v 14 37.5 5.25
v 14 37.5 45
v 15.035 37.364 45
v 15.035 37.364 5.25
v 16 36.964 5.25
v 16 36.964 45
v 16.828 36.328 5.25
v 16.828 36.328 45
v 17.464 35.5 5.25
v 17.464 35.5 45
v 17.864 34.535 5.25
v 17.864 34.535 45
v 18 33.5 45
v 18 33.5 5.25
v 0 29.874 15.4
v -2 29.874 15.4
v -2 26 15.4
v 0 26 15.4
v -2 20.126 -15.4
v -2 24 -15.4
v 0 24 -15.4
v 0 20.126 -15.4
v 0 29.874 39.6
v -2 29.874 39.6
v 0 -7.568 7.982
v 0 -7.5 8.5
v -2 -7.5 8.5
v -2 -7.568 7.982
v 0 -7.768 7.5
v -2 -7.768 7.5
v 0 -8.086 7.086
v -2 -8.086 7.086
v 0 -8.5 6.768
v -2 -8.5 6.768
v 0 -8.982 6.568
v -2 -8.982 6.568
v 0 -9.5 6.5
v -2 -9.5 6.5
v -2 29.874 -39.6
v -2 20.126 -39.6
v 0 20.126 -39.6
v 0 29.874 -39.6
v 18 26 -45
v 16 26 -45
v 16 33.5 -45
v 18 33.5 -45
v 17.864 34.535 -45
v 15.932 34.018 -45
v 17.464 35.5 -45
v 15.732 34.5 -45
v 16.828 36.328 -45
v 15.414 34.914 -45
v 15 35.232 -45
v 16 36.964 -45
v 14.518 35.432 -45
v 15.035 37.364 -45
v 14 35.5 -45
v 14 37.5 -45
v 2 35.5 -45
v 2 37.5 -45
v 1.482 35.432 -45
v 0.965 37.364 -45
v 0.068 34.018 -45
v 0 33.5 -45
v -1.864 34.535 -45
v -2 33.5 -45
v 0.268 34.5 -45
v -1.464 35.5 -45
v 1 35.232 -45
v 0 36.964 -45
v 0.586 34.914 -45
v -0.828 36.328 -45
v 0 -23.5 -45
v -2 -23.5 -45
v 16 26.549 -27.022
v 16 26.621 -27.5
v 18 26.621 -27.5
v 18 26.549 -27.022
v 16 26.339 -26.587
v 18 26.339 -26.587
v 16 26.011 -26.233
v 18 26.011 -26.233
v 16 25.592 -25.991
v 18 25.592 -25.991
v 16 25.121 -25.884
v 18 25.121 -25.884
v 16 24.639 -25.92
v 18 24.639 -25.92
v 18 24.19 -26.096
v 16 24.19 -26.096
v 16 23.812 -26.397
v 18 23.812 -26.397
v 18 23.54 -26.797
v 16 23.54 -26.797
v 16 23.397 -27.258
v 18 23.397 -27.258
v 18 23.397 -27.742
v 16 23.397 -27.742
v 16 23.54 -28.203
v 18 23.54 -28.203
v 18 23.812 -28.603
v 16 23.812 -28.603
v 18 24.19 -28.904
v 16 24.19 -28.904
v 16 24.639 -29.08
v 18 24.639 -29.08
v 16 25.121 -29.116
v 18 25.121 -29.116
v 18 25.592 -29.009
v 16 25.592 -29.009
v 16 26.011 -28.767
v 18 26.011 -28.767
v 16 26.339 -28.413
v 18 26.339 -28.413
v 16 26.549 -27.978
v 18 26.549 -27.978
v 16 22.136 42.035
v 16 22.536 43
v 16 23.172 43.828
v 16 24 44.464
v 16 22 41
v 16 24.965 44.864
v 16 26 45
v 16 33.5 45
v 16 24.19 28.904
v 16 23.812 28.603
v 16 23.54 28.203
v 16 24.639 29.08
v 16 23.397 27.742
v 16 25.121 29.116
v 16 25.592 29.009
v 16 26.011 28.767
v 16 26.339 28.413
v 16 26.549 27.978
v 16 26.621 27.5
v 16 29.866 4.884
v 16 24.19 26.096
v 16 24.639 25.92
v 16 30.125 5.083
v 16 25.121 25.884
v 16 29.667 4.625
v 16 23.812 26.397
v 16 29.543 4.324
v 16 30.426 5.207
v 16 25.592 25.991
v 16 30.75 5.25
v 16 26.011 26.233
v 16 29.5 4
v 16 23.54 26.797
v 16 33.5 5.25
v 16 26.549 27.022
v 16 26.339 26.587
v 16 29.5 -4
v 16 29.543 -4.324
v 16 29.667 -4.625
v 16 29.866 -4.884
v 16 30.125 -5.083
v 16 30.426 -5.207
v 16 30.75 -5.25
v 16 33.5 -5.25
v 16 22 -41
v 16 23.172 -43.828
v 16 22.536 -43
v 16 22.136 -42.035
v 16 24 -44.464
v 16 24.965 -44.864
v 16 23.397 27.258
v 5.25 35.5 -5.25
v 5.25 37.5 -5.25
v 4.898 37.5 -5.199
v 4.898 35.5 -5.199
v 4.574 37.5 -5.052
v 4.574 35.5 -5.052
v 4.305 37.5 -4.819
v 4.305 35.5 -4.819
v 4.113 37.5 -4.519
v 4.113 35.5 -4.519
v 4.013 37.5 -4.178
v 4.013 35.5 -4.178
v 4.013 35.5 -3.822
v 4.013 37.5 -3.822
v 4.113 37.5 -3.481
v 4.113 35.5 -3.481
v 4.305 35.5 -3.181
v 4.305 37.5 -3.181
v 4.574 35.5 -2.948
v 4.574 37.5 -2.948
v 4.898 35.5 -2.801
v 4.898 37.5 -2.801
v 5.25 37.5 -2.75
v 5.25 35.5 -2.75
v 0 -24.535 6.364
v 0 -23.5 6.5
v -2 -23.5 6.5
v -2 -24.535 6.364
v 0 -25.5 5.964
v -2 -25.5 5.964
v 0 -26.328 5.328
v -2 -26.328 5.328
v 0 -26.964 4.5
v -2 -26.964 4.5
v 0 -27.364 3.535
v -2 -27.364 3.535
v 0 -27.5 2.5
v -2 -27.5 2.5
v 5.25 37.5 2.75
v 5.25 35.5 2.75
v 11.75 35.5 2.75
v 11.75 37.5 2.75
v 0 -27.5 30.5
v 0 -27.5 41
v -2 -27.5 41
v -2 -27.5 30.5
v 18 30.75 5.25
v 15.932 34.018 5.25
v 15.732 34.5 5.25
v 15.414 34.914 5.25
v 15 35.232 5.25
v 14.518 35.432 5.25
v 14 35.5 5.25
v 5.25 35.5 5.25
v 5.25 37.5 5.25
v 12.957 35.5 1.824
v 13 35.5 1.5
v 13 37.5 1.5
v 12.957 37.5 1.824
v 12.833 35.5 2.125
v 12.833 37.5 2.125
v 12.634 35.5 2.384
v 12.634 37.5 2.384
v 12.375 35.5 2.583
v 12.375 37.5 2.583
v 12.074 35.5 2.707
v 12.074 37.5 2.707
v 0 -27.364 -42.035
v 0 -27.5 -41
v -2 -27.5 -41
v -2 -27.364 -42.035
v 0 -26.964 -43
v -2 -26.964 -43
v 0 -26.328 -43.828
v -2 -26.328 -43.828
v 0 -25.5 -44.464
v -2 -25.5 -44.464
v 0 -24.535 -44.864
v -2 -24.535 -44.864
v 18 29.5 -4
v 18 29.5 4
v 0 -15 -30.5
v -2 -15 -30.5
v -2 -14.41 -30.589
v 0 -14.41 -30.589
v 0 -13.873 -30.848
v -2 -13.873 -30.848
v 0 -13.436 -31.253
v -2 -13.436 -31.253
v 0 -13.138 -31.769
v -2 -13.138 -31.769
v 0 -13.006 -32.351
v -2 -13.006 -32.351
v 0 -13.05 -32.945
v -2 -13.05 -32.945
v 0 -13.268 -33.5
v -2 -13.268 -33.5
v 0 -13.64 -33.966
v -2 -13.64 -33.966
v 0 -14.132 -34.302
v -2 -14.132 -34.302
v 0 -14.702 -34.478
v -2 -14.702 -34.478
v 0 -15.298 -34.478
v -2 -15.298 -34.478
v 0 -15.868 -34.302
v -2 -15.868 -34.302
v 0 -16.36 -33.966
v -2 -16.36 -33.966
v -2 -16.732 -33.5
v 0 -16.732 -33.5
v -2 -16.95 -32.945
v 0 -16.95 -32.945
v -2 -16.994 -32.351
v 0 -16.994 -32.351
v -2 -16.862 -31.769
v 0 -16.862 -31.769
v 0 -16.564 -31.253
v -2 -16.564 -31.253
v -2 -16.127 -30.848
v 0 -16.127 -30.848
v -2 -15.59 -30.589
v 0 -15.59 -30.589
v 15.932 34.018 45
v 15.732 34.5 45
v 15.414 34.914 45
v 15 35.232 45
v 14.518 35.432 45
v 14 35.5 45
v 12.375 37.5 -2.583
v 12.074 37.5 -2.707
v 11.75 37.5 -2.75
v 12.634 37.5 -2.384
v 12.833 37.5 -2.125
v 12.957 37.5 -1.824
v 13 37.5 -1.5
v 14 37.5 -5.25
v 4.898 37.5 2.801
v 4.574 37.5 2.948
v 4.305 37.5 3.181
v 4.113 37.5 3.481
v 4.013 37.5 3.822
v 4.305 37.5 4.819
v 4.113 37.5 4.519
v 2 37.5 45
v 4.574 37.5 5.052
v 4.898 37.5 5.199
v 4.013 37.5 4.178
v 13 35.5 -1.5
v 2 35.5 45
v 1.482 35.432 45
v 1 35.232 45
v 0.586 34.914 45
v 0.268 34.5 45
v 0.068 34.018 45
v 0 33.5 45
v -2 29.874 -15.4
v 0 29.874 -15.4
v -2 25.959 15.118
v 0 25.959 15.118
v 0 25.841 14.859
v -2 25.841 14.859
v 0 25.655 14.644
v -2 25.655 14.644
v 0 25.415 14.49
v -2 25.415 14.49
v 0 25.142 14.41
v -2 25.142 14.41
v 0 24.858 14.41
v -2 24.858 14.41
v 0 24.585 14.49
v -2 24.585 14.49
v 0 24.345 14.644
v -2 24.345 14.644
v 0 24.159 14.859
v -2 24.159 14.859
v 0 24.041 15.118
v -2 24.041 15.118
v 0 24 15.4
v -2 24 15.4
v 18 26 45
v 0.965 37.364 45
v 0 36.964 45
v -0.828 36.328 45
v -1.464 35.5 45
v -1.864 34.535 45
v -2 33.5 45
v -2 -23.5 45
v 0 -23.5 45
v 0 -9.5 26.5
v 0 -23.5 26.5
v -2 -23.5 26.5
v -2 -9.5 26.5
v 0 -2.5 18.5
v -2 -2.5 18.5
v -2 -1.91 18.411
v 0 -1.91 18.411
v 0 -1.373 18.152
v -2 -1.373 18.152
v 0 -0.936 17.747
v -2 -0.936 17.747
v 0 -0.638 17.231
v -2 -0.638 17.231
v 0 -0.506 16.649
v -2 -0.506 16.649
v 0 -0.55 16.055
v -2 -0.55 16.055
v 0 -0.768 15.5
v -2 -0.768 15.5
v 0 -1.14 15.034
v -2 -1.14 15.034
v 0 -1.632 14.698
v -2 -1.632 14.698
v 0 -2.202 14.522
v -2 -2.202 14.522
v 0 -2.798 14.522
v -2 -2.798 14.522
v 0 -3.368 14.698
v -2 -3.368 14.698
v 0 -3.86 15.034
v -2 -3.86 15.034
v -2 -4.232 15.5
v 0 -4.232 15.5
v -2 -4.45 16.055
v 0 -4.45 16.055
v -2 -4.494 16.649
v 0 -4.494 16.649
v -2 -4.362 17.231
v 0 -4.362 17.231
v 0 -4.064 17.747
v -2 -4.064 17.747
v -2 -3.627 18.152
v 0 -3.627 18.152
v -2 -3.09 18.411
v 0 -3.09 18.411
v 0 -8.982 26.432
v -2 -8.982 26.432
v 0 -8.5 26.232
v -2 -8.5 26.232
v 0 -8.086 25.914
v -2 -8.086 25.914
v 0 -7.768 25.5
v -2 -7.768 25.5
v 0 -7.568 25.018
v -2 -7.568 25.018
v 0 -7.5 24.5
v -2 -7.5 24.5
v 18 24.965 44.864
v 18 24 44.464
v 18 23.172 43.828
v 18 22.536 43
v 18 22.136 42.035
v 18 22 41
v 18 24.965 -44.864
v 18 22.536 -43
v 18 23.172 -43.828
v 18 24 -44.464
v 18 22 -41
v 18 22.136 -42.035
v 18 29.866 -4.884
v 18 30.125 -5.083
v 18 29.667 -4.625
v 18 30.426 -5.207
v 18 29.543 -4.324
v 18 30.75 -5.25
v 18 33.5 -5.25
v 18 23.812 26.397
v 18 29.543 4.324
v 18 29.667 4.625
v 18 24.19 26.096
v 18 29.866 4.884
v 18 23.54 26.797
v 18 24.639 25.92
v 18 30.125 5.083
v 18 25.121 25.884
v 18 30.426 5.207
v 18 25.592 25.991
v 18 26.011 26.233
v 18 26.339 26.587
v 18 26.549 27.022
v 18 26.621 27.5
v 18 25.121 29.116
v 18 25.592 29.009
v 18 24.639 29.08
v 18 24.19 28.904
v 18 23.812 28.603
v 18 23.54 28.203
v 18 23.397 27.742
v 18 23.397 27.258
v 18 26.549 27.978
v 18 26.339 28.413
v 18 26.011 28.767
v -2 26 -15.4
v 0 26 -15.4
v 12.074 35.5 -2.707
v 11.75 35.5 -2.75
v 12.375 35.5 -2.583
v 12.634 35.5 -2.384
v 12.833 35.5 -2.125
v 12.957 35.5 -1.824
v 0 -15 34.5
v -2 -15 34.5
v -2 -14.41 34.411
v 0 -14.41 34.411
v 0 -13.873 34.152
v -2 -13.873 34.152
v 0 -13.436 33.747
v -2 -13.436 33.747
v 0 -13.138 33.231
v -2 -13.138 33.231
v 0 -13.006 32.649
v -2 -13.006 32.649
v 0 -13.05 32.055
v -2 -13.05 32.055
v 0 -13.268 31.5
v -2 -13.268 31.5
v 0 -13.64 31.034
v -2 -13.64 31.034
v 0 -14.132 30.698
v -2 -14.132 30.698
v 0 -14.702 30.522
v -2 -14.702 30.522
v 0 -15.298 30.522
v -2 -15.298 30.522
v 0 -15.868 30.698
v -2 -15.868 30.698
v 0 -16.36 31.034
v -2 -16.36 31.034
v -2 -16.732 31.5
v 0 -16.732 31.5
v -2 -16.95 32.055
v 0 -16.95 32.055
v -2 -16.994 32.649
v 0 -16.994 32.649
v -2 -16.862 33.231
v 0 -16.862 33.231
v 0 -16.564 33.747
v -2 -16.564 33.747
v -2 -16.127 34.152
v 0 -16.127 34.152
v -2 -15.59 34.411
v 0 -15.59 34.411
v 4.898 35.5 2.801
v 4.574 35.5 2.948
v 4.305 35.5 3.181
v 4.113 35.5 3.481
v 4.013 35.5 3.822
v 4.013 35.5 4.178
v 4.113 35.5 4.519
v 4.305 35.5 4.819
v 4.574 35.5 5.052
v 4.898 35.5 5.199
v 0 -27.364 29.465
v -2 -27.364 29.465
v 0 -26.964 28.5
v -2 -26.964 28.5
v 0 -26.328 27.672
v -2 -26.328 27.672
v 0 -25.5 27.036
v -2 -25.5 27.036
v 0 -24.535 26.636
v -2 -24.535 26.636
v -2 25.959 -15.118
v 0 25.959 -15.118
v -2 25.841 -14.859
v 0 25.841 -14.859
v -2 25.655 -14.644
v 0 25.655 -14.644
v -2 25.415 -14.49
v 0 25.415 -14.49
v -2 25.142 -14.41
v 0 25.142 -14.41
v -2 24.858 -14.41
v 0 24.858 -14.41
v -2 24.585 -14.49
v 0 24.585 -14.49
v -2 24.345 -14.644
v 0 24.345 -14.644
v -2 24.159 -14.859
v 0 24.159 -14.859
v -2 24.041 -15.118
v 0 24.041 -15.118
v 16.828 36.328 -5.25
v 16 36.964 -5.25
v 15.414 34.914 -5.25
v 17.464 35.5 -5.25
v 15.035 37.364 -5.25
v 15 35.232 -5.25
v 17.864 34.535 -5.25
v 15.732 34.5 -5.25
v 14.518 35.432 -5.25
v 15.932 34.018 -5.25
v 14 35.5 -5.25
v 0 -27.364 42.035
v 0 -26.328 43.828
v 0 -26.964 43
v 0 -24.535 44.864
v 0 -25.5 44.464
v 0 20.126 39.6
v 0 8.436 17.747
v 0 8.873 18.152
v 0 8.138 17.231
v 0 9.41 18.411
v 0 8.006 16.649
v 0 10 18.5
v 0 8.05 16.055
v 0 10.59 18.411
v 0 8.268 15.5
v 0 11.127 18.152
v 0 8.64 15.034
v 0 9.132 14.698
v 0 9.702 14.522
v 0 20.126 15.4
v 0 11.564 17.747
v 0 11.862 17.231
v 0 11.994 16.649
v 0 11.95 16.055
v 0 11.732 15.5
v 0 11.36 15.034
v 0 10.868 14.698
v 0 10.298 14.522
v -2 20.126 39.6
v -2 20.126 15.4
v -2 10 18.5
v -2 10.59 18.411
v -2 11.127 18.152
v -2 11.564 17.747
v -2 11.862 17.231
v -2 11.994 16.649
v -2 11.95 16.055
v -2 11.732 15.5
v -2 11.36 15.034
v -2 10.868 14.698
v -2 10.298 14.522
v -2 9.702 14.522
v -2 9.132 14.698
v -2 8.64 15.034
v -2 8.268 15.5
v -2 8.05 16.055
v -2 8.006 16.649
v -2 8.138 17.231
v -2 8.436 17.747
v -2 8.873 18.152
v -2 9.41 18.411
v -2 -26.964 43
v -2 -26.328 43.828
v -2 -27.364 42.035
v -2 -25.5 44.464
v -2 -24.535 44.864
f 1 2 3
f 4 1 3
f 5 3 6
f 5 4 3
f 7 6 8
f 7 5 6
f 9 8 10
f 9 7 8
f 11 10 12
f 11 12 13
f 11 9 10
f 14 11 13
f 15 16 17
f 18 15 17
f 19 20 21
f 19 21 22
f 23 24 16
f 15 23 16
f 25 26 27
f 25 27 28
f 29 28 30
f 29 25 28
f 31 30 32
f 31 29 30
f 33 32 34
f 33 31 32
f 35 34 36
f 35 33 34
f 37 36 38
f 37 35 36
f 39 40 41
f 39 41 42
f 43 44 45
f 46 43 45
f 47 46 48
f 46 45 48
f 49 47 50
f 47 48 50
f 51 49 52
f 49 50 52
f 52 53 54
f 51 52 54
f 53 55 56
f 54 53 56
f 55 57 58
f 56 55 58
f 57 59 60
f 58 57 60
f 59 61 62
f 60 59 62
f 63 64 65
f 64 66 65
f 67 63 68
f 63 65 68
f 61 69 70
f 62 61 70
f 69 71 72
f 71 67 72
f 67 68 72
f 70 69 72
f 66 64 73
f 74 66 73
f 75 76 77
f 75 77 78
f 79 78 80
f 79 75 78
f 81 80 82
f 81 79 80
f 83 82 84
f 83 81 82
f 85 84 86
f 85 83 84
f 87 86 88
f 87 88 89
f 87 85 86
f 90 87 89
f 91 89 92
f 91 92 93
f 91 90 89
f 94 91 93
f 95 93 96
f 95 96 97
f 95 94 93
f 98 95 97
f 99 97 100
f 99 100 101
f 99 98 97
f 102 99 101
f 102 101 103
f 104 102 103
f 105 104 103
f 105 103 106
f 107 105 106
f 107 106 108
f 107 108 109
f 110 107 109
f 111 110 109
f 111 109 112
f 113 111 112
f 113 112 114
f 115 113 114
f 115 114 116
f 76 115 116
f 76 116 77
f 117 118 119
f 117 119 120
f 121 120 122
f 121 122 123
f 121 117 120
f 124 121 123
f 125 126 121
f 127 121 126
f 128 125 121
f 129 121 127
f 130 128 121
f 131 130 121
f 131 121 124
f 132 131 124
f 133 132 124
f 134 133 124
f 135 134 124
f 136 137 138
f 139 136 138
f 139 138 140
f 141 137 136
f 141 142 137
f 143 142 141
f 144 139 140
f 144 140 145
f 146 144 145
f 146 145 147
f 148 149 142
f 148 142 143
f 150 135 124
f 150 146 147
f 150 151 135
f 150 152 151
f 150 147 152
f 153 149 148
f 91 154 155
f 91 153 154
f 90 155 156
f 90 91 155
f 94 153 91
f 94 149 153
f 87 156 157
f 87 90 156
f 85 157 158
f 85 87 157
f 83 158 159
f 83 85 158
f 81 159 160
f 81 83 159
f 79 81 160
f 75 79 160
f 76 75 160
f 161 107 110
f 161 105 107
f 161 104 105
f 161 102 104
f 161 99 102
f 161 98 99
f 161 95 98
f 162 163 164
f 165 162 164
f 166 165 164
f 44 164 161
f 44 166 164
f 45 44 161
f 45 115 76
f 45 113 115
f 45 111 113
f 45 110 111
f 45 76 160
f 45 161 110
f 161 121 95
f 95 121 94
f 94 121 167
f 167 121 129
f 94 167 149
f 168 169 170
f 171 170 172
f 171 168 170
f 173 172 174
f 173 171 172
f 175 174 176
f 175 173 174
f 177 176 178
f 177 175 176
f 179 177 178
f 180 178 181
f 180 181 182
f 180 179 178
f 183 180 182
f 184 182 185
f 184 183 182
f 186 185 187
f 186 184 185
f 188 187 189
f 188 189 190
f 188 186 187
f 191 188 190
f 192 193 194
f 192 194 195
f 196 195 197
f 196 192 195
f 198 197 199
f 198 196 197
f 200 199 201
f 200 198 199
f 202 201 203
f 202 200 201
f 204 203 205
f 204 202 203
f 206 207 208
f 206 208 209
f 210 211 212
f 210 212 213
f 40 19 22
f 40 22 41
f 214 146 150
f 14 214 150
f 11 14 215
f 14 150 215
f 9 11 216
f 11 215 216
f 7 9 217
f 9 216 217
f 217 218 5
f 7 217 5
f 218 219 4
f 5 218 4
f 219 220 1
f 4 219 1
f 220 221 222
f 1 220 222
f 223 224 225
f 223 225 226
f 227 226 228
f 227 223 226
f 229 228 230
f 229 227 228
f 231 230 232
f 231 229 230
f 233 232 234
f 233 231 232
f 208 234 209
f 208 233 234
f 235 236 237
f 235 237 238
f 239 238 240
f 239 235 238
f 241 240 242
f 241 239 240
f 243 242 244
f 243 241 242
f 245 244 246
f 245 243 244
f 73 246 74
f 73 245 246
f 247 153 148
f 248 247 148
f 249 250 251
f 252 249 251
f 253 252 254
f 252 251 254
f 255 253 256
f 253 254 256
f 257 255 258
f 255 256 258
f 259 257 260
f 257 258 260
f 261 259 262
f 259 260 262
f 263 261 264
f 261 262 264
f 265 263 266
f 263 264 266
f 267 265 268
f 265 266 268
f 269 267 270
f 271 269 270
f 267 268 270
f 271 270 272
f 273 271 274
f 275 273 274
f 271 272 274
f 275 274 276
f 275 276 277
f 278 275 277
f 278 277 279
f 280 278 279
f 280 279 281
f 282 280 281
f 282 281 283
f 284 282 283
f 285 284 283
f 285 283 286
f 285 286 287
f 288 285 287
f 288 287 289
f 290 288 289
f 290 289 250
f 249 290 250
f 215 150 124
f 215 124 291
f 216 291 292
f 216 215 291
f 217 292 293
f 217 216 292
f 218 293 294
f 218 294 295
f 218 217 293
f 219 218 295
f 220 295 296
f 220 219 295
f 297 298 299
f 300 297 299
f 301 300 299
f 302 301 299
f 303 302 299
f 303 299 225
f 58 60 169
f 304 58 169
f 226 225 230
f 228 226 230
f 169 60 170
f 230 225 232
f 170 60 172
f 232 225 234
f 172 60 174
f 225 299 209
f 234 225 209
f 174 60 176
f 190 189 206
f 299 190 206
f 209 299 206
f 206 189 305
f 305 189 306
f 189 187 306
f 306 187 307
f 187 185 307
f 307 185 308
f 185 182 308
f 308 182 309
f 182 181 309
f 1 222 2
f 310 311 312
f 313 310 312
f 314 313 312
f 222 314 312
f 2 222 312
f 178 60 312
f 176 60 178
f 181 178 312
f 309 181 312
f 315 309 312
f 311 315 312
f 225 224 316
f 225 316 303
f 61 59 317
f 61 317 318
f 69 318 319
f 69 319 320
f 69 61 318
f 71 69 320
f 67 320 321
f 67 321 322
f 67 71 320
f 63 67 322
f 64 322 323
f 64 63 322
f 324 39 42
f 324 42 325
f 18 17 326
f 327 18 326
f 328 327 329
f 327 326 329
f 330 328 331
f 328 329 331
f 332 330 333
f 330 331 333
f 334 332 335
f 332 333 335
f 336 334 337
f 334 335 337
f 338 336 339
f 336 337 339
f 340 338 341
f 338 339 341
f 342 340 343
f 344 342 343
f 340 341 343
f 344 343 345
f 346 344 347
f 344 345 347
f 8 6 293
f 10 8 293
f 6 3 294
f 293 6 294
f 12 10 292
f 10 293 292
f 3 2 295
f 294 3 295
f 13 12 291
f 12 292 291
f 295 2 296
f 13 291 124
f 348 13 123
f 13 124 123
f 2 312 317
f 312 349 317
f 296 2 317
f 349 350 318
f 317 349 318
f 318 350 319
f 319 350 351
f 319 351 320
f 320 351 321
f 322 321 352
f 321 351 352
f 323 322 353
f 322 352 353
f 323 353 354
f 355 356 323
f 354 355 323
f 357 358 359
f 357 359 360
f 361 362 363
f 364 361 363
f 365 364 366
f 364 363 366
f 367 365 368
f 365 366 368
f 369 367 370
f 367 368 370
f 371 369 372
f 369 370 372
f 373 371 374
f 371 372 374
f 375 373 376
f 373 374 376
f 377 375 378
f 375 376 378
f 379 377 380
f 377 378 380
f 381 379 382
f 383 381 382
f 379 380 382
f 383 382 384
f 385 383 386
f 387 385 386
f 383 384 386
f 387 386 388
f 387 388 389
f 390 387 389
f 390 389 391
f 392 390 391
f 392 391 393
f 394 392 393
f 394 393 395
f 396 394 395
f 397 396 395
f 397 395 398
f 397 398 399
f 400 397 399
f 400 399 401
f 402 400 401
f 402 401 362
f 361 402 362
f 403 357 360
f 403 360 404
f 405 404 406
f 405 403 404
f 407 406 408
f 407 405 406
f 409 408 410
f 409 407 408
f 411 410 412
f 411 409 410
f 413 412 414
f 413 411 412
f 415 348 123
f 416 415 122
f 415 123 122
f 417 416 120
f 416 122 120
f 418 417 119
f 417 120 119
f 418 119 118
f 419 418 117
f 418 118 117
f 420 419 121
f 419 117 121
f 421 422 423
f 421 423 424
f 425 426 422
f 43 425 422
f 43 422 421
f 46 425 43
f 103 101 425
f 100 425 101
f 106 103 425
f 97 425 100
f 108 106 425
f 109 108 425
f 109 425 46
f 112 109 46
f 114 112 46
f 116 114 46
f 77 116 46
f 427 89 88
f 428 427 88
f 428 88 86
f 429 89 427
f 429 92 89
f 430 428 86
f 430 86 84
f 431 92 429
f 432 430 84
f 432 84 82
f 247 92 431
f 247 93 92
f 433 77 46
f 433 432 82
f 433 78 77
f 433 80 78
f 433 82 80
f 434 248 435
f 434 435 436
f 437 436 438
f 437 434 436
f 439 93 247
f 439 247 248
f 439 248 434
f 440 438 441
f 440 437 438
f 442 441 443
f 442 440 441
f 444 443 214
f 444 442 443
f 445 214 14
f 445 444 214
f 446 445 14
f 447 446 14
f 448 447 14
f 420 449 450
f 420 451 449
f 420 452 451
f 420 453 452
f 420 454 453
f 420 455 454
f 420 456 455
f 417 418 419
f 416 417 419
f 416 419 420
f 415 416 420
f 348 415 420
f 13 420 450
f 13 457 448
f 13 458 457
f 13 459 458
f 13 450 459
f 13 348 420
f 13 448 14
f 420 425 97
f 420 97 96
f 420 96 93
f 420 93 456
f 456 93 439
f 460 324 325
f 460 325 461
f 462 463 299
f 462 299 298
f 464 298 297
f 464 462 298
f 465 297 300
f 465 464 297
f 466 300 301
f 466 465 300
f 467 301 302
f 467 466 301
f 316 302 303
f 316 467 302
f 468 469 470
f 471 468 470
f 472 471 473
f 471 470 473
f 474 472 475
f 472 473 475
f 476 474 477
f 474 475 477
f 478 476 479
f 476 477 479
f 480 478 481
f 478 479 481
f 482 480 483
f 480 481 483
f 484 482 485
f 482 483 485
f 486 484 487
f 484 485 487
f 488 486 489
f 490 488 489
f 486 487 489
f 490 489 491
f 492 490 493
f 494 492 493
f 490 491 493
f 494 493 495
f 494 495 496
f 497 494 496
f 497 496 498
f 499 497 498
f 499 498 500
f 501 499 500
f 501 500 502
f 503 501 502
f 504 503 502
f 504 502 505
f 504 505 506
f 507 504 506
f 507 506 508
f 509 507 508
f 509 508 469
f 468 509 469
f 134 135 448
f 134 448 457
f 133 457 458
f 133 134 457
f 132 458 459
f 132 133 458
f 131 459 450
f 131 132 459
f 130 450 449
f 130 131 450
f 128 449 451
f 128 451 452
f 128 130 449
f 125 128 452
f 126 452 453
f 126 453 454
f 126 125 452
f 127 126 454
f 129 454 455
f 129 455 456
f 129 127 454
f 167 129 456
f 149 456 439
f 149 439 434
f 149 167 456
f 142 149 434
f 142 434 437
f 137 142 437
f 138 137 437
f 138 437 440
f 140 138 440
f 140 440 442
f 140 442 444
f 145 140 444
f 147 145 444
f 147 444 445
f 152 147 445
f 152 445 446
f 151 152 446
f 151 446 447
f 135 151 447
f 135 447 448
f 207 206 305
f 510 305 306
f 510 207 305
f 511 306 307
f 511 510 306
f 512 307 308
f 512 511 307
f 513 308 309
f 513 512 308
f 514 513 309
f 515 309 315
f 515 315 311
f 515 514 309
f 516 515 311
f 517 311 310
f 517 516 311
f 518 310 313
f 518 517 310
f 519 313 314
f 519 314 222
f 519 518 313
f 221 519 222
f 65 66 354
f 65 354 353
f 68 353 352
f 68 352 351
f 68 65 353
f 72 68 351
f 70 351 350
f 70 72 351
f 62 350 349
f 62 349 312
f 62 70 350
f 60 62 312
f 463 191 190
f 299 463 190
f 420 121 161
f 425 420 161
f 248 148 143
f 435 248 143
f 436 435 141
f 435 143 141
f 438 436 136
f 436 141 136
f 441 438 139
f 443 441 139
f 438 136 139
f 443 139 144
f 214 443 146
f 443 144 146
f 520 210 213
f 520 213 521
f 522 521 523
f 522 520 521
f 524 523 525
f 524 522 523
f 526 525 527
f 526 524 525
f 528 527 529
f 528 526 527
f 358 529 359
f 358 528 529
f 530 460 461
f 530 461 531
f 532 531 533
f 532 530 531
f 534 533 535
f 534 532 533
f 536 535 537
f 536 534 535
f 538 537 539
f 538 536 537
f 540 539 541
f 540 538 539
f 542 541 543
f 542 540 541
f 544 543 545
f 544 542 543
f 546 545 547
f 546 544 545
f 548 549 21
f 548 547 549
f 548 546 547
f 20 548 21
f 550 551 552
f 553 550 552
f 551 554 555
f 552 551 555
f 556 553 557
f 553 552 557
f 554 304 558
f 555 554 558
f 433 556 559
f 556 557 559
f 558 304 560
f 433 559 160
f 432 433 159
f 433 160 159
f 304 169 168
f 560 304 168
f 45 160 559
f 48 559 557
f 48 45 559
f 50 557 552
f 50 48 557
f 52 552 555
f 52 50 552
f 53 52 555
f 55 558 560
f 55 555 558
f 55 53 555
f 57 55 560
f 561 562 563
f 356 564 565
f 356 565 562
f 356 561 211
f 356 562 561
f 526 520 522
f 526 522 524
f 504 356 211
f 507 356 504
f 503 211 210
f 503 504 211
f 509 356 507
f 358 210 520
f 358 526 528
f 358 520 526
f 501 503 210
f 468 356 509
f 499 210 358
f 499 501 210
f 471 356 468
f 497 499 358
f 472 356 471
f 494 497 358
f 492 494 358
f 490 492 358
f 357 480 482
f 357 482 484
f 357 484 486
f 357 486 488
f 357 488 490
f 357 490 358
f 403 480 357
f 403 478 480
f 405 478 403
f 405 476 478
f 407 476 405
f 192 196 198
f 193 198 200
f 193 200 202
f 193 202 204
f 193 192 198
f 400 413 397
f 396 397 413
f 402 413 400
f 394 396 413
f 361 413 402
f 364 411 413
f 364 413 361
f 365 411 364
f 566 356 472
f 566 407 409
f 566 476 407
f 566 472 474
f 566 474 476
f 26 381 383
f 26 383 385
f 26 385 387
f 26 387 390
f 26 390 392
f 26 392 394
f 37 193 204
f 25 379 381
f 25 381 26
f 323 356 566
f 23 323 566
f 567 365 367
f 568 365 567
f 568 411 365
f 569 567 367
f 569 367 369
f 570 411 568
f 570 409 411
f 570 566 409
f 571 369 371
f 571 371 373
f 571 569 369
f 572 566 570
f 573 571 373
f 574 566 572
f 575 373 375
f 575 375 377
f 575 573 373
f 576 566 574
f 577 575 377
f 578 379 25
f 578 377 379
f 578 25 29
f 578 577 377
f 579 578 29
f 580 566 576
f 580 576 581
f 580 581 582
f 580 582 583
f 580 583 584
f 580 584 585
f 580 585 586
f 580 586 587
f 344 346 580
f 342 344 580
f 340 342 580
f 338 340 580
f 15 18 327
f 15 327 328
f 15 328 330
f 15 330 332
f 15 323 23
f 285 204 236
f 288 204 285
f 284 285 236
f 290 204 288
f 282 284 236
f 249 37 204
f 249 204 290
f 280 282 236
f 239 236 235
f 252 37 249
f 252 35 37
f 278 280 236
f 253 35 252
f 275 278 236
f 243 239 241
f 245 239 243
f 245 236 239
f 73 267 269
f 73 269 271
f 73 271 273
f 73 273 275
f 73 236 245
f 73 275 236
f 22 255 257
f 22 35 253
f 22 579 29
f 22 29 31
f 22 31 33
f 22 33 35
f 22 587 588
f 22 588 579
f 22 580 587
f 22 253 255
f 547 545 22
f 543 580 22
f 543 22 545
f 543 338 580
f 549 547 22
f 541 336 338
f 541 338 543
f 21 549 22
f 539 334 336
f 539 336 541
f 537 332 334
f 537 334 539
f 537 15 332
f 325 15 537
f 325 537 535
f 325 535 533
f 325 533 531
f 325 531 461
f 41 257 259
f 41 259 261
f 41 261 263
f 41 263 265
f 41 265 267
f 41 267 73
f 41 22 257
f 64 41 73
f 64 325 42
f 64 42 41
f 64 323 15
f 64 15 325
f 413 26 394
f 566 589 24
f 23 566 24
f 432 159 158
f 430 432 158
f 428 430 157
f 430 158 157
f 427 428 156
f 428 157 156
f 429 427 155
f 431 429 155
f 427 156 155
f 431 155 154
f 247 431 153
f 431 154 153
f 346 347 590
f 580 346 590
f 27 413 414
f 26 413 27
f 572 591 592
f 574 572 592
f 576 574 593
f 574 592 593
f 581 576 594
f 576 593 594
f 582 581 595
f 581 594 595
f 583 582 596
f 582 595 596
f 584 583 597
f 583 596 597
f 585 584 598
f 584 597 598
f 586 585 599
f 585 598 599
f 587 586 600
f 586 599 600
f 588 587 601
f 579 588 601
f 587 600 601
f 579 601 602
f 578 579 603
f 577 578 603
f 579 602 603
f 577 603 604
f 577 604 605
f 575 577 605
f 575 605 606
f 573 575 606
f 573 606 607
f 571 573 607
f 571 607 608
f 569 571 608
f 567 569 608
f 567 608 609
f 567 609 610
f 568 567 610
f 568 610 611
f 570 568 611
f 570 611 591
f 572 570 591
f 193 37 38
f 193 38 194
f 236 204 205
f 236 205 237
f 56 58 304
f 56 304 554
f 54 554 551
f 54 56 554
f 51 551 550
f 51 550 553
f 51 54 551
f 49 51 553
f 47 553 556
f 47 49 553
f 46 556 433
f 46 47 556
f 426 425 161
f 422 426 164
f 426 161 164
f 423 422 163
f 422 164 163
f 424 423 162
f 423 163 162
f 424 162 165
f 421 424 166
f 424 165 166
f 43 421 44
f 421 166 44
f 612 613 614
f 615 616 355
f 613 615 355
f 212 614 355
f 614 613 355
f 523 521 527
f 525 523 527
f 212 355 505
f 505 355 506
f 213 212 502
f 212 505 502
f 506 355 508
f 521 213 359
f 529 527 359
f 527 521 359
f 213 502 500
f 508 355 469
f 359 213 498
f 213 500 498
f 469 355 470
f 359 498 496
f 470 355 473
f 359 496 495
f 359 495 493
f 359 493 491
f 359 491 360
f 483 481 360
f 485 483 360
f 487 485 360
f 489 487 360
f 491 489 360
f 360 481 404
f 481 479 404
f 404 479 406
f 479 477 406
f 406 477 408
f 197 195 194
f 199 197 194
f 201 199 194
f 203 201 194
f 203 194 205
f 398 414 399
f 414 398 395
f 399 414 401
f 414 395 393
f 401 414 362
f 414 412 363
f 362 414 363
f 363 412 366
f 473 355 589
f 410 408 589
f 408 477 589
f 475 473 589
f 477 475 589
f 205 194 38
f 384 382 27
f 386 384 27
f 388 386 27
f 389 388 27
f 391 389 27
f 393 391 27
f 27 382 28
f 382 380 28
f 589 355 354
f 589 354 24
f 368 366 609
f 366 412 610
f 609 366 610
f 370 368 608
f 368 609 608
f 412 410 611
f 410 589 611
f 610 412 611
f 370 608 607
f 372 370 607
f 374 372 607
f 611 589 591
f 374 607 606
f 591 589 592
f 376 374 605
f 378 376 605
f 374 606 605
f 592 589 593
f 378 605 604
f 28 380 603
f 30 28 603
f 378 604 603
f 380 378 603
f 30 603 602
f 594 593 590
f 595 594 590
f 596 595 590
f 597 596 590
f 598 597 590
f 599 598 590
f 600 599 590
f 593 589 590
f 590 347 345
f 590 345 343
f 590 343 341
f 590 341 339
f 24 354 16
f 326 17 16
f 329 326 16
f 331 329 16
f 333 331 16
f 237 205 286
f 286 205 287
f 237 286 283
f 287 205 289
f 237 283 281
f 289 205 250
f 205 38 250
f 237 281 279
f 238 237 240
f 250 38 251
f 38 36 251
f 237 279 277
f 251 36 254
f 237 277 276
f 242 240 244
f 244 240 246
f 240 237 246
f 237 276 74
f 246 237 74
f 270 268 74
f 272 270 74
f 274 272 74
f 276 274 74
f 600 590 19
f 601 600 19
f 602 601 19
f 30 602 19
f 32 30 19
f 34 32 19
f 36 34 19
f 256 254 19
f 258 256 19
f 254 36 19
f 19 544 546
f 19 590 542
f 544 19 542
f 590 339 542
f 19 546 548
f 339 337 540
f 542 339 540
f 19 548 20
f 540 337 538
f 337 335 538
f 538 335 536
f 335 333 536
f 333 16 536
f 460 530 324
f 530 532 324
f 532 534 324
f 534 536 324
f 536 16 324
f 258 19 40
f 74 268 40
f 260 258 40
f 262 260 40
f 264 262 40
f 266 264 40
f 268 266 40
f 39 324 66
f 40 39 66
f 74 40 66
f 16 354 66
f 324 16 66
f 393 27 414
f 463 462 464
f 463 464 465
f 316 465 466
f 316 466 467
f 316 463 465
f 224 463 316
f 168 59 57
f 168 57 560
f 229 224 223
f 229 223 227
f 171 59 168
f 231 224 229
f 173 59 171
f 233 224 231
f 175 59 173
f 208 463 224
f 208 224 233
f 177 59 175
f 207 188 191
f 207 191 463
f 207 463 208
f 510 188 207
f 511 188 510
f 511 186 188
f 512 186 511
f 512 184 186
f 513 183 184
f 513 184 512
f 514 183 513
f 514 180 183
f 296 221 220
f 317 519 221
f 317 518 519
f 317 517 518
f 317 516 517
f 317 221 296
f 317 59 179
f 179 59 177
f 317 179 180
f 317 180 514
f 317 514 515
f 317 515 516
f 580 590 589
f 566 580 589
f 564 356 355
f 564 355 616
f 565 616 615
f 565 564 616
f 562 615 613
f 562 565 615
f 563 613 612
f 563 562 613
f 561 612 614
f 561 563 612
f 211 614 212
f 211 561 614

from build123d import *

# Parameters (mm, degrees)
BOSS_EXTRUDE1_DEPTH         = 2
F_4_0_4_DIAMETER_HOLE1_D    = 4
M3_CLEARANCE_HOLE1_D        = 3.242
CUT_EXTRUDE2_DEPTH          = 81.257405435
CUT_EXTRUDE3_DEPTH          = 81.257405435
SKETCHED_START              = 53.789908981
SKETCHED_BEND1_OUTLINE_W    = 2
SKETCHED_BEND1_OUTLINE_H    = 90
SKETCHED_BEND1_DEPTH        = 12.63486898
SKETCHED_START_2            = 52.212388981
SKETCHED_BEND1_2_OUTLINE_R  = 1.621
SKETCHED_BEND1_2_DEPTH      = 1.137013932
SKETCHED_START_3            = 50.212388981
SKETCHED_BEND1_3_OUTLINE_R  = 1.621
SKETCHED_BEND1_3_DEPTH      = 4
SKETCHED_START_4            = -45
SKETCHED_BEND1_4_DEPTH      = 90
SKETCHED_START_5            = -2
SKETCHED_BEND2_OUTLINE_W    = 16.712388981
SKETCHED_BEND2_OUTLINE_H    = 90
SKETCHED_BEND2_DEPTH        = 15.5
SKETCHED_BEND2_2_OUTLINE_W  = 2
SKETCHED_BEND2_2_OUTLINE_H  = 90
SKETCHED_BEND2_2_DEPTH      = 0.20548
SKETCHED_START_6            = 2
SKETCHED_BEND2_3_OUTLINE_W  = 2
SKETCHED_BEND2_3_OUTLINE_H  = 39.75
SKETCHED_BEND2_3_DEPTH      = 12
SKETCHED_START_7            = 1.58904
SKETCHED_BEND2_4_OUTLINE_W  = 2
SKETCHED_BEND2_4_OUTLINE_H  = 5.5
SKETCHED_BEND2_4_DEPTH      = 10.160960011
SKETCHED_BEND2_5_OUTLINE_W  = 2
SKETCHED_BEND2_5_OUTLINE_H  = 2.5
SKETCHED_BEND2_5_DEPTH      = 2.410960011
SKETCHED_START_8            = 14
SKETCHED_BEND2_6_OUTLINE_R  = 1.621
SKETCHED_BEND2_6_DEPTH      = 4
SKETCHED_BEND2_7_OUTLINE_R  = 1.621
SKETCHED_BEND2_7_DEPTH      = 2
SKETCHED_START_9            = 11.750000011
SKETCHED_BEND2_8_OUTLINE_W  = 2
SKETCHED_BEND2_8_OUTLINE_H  = 5.5
SKETCHED_BEND2_8_DEPTH      = 1.25
SKETCHED_START_10           = 4.000000011
SKETCHED_BEND2_9_OUTLINE_W  = 2
SKETCHED_BEND2_9_OUTLINE_H  = 2.5
SKETCHED_BEND2_9_DEPTH      = 1.25
SKETCHED_BEND2_10_DEPTH     = 90
SKETCHED_START_11           = 30
SKETCHED_BEND2_11_OUTLINE_W = 2
SKETCHED_BEND2_11_OUTLINE_H = 39.75
SKETCHED_BEND2_11_DEPTH     = 1.443495006
SKETCHED_START_12           = 37.29452
SKETCHED_BEND2_12_OUTLINE_W = 2
SKETCHED_BEND2_12_OUTLINE_H = 39.75
SKETCHED_BEND2_12_DEPTH     = 0.20548
SKETCHED_START_13           = 31.443495006
SKETCHED_BEND2_13_DEPTH     = 5.861984994


with BuildPart() as part:
    # Sketch7 → Boss-Extrude1 (new body)
    with BuildSketch(Plane(origin=(0, 0, 0), x_dir=(0, 0, -1), z_dir=(1, 0, 0))):
        with BuildLine():
            Line((-45, 62.424777961), (-45, -23.5))
            ThreePointArc((-45, -23.5), (-43.828427125, -26.328427125), (-41, -27.5))
            Line((-41, -27.5), (-30.5, -27.5))
            ThreePointArc((-30.5, -27.5), (-27.671572875, -26.328427125), (-26.5, -23.5))
            Line((-26.5, -23.5), (-26.5, -9.5))
            ThreePointArc((-26.5, -9.5), (-25.914213562, -8.085786438), (-24.5, -7.5))
            Line((-24.5, -7.5), (-8.5, -7.5))
            ThreePointArc((-8.5, -7.5), (-7.085786438, -8.085786438), (-6.5, -9.5))
            Line((-6.5, -9.5), (-6.5, -23.5))
            ThreePointArc((-6.5, -23.5), (-5.328427125, -26.328427125), (-2.5, -27.5))
            Line((-2.5, -27.5), (41, -27.5))
            ThreePointArc((41, -27.5), (43.828427125, -26.328427125), (45, -23.5))
            Line((45, -23.5), (45, 62.424777961))
            ThreePointArc((45, 62.424777961), (43.828427125, 65.253205086), (41, 66.424777961))
            Line((41, 66.424777961), (-41, 66.424777961))
            ThreePointArc((-41, 66.424777961), (-43.828427125, 65.253205086), (-45, 62.424777961))
        make_face()
    extrude(amount=-BOSS_EXTRUDE1_DEPTH)

    # Ø4.0 (4) Diameter Hole1 (through all)
    with Locations(Plane(origin=(0, 0, 0), x_dir=(0, 0, -1), z_dir=(1, 0, 0))):
        with Locations((-16.5, -2.5), (32.5, -15), (-16.5, 10), (-32.5, -15)):
            Hole(F_4_0_4_DIAMETER_HOLE1_D / 2)

    # M3 Clearance Hole1 (through all)
    with Locations(Plane(origin=(0, 0, 0), x_dir=(0, 0, -1), z_dir=(1, 0, 0))):
        with Locations((-27.5, 63.424777961), (27.5, 63.424777961)):
            Hole(M3_CLEARANCE_HOLE1_D / 2)

    # Sketch13 → Cut-Extrude2 (cut, through all)
    with BuildSketch(Plane.ZY.offset(2)):
        with BuildLine():
            Line((39.6, 29.874423052), (15.4, 29.874423052))
            Line((15.4, 29.874423052), (15.4, 26))
            ThreePointArc((15.4, 26), (14.4, 25), (15.4, 24))
            Line((15.4, 24), (15.4, 20.125576948))
            Line((15.4, 20.125576948), (39.6, 20.125576948))
            Line((39.6, 20.125576948), (39.6, 29.874423052))
        make_face()
        with BuildLine():
            Line((-15.4, 24), (-15.4, 20.125576948))
            Line((-15.4, 20.125576948), (-39.6, 20.125576948))
            Line((-39.6, 20.125576948), (-39.6, 29.874423052))
            Line((-39.6, 29.874423052), (-15.4, 29.874423052))
            Line((-15.4, 29.874423052), (-15.4, 26))
            ThreePointArc((-15.4, 26), (-14.4, 25), (-15.4, 24))
        make_face()
    extrude(amount=-CUT_EXTRUDE2_DEPTH, mode=Mode.SUBTRACT)

    # Sketch14 → Cut-Extrude3 (cut, through all)
    with BuildSketch(Plane.ZY.offset(2)):
        with BuildLine():
            Line((5.25, 41.462388992), (5.25, 57.674777954))
            ThreePointArc((5.25, 57.674777954), (4.883883476, 58.55866143), (4, 58.924777954))
            Line((4, 58.924777954), (-4, 58.924777954))
            ThreePointArc((-4, 58.924777954), (-4.883883476, 58.55866143), (-5.25, 57.674777954))
            Line((-5.25, 57.674777954), (-5.25, 41.462388992))
            ThreePointArc((-5.25, 41.462388992), (-4, 40.212388992), (-2.75, 41.462388992))
            Line((-2.75, 41.462388992), (-2.75, 47.962388992))
            ThreePointArc((-2.75, 47.962388992), (-2.383883476, 48.846272468), (-1.5, 49.212388992))
            Line((-1.5, 49.212388992), (1.5, 49.212388992))
            ThreePointArc((1.5, 49.212388992), (2.383883476, 48.846272468), (2.75, 47.962388992))
            Line((2.75, 47.962388992), (2.75, 41.462388992))
            ThreePointArc((2.75, 41.462388992), (4, 40.212388992), (5.25, 41.462388992))
        make_face()
    extrude(amount=-CUT_EXTRUDE3_DEPTH, mode=Mode.SUBTRACT)

    # Sketched Bend1: read off the stored shape, not the designer's step
    # Sketched Bend1 outline → Sketched Bend1 (cut)
    with BuildSketch(Plane(origin=(0, 0, 0), x_dir=(1, 0, 0), z_dir=(0, 1, 0)).offset(SKETCHED_START)):
        with Locations((-1, 0)):
            Rectangle(SKETCHED_BEND1_OUTLINE_W, SKETCHED_BEND1_OUTLINE_H)
    extrude(amount=SKETCHED_BEND1_DEPTH, mode=Mode.SUBTRACT)

    # Sketched Bend1 2 outline → Sketched Bend1 2 (add)
    with BuildSketch(Plane(origin=(0, 0, 0), x_dir=(1, 0, 0), z_dir=(0, 1, 0)).offset(SKETCHED_START_2)):
        with BuildLine():
            ThreePointArc((13.5, 41), (12.328427125, 43.828427125), (9.5, 45))
            Line((9.5, 45), (0, 45))
            Line((0, 45), (0, 5.25))
            Line((0, 5.25), (4.749999993, 5.25))
            ThreePointArc((4.749999993, 5.25), (5.633883469, 4.883883476), (5.999999993, 4))
            Line((5.999999993, 4), (5.999999993, -4))
            ThreePointArc((5.999999993, -4), (5.633883469, -4.883883476), (4.749999993, -5.25))
            Line((4.749999993, -5.25), (0, -5.25))
            Line((0, -5.25), (0, -45))
            Line((0, -45), (9.5, -45))
            ThreePointArc((9.5, -45), (12.328427125, -43.828427125), (13.5, -41))
            Line((13.5, -41), (13.5, 41))
        make_face()
        with Locations((10.5, -27.5)):
            Circle(SKETCHED_BEND1_2_OUTLINE_R, mode=Mode.SUBTRACT)
        with Locations((10.5, 27.5)):
            Circle(SKETCHED_BEND1_2_OUTLINE_R, mode=Mode.SUBTRACT)
    extrude(amount=SKETCHED_BEND1_2_DEPTH)

    # Sketched Bend1 3 outline → Sketched Bend1 3 (add)
    with BuildSketch(Plane(origin=(0, 0, 0), x_dir=(1, 0, 0), z_dir=(0, 1, 0)).offset(SKETCHED_START_3)):
        with BuildLine():
            ThreePointArc((13.5, 41), (12.328427125, 43.828427125), (9.5, 45))
            Line((9.5, 45), (0, 45))
            Line((0, 45), (0, 5.25))
            Line((0, 5.25), (4.749999993, 5.25))
            ThreePointArc((4.749999993, 5.25), (5.633883469, 4.883883476), (5.999999993, 4))
            Line((5.999999993, 4), (5.999999993, -4))
            ThreePointArc((5.999999993, -4), (5.633883469, -4.883883476), (4.749999993, -5.25))
            Line((4.749999993, -5.25), (0, -5.25))
            Line((0, -5.25), (0, -45))
            Line((0, -45), (9.5, -45))
            ThreePointArc((9.5, -45), (12.328427125, -43.828427125), (13.5, -41))
            Line((13.5, -41), (13.5, 41))
        make_face()
        with Locations((10.5, -27.5)):
            Circle(SKETCHED_BEND1_3_OUTLINE_R, mode=Mode.SUBTRACT)
        with Locations((10.5, 27.5)):
            Circle(SKETCHED_BEND1_3_OUTLINE_R, mode=Mode.SUBTRACT)
    extrude(amount=SKETCHED_BEND1_3_DEPTH)

    # Sketched Bend1 4 outline → Sketched Bend1 4 (cut)
    with BuildSketch(Plane.XY.offset(SKETCHED_START_4)):
        with BuildLine():
            ThreePointArc((-2, 50.212388981), (-0.828427125, 53.040816106), (2, 54.212388981))
            Line((2, 54.212388981), (0, 54.212388981))
            Line((0, 54.212388981), (0, 53.789908981))
            Line((0, 53.789908981), (-2, 53.789908981))
            Line((-2, 53.789908981), (-2, 50.212388981))
        make_face()
        with BuildLine():
            ThreePointArc((2, 52.212388981), (0.585786438, 51.626602543), (0, 50.212388981))
            Line((0, 50.212388981), (13.5, 50.212388981))
            Line((13.5, 50.212388981), (13.5, 52.212388981))
            Line((13.5, 52.212388981), (2, 52.212388981))
        make_face()
    extrude(amount=SKETCHED_BEND1_4_DEPTH, mode=Mode.SUBTRACT)

    # Sketched Bend2: read off the stored shape, not the designer's step
    # Sketched Bend2 outline → Sketched Bend2 (cut)
    with BuildSketch(Plane.YZ.offset(SKETCHED_START_5)):
        with Locations((45.856194491, 0)):
            Rectangle(SKETCHED_BEND2_OUTLINE_W, SKETCHED_BEND2_OUTLINE_H)
        with BuildLine():
            Line((52.212388981, 5.25), (52.212388981, -5.25))
            Line((52.212388981, -5.25), (41.462388992, -5.25))
            ThreePointArc((41.462388992, -5.25), (40.212388992, -4), (41.462388992, -2.75))
            Line((41.462388992, -2.75), (47.962388992, -2.75))
            ThreePointArc((47.962388992, -2.75), (48.846272468, -2.383883476), (49.212388992, -1.5))
            Line((49.212388992, -1.5), (49.212388992, 1.5))
            ThreePointArc((49.212388992, 1.5), (48.846272468, 2.383883476), (47.962388992, 2.75))
            Line((47.962388992, 2.75), (41.462388992, 2.75))
            ThreePointArc((41.462388992, 2.75), (40.212388992, 4), (41.462388992, 5.25))
            Line((41.462388992, 5.25), (52.212388981, 5.25))
        make_face(mode=Mode.SUBTRACT)
    extrude(amount=SKETCHED_BEND2_DEPTH, mode=Mode.SUBTRACT)

    # Sketched Bend2 2 outline → Sketched Bend2 2 (cut)
    with BuildSketch(Plane.YZ.offset(SKETCHED_START_5)):
        with Locations((36.5, 0)):
            Rectangle(SKETCHED_BEND2_2_OUTLINE_W, SKETCHED_BEND2_2_OUTLINE_H)
    extrude(amount=SKETCHED_BEND2_2_DEPTH, mode=Mode.SUBTRACT)



with BuildPart() as body_2:
    # Sketched Bend2 3 outline → Sketched Bend2 3 (new body)
    with BuildSketch(Plane.YZ.offset(SKETCHED_START_6)):
        with Locations((36.5, 25.125)):
            Rectangle(SKETCHED_BEND2_3_OUTLINE_W, SKETCHED_BEND2_3_OUTLINE_H)
        with Locations((36.5, -25.125)):
            Rectangle(SKETCHED_BEND2_3_OUTLINE_W, SKETCHED_BEND2_3_OUTLINE_H)
    extrude(amount=SKETCHED_BEND2_3_DEPTH)



with BuildPart() as body_3:
    # Sketched Bend2 4 outline → Sketched Bend2 4 (new body)
    with BuildSketch(Plane.YZ.offset(SKETCHED_START_7)):
        with Locations((36.5, 0)):
            Rectangle(SKETCHED_BEND2_4_OUTLINE_W, SKETCHED_BEND2_4_OUTLINE_H)
    extrude(amount=SKETCHED_BEND2_4_DEPTH)


with BuildPart() as body_2_1:
    add(body_2.part)

    add(body_3.part)  # Sketched Bend2 5 merges body 3
    # Sketched Bend2 5 outline → Sketched Bend2 5 (add)
    with BuildSketch(Plane.YZ.offset(SKETCHED_START_7)):
        with Locations((36.5, 4)):
            Rectangle(SKETCHED_BEND2_5_OUTLINE_W, SKETCHED_BEND2_5_OUTLINE_H)
        with Locations((36.5, -4)):
            Rectangle(SKETCHED_BEND2_5_OUTLINE_W, SKETCHED_BEND2_5_OUTLINE_H)
    extrude(amount=SKETCHED_BEND2_5_DEPTH)

    # Sketched Bend2 6 outline → Sketched Bend2 6 (add)
    with BuildSketch(Plane.YZ.offset(SKETCHED_START_8)):
        with BuildLine():
            Line((37.5, 45), (26, 45))
            ThreePointArc((26, 45), (23.171572875, 43.828427125), (22, 41))
            Line((22, 41), (22, -41))
            ThreePointArc((22, -41), (23.171572875, -43.828427125), (26, -45))
            Line((26, -45), (37.5, -45))
            Line((37.5, -45), (37.5, -5.25))
            Line((37.5, -5.25), (30.750000007, -5.25))
            ThreePointArc((30.750000007, -5.25), (29.866116531, -4.883883476), (29.500000007, -4))
            Line((29.500000007, -4), (29.500000007, 4))
            ThreePointArc((29.500000007, 4), (29.866116531, 4.883883476), (30.750000007, 5.25))
            Line((30.750000007, 5.25), (37.5, 5.25))
            Line((37.5, 5.25), (37.5, 45))
        make_face()
        with Locations((25, 27.5)):
            Circle(SKETCHED_BEND2_6_OUTLINE_R, mode=Mode.SUBTRACT)
        with Locations((25, -27.5)):
            Circle(SKETCHED_BEND2_6_OUTLINE_R, mode=Mode.SUBTRACT)
    extrude(amount=SKETCHED_BEND2_6_DEPTH)


with BuildPart() as part_1:
    add(part.part)

    add(body_2_1.part)  # Sketched Bend2 7 merges body 2
    # Sketched Bend2 7 outline → Sketched Bend2 7 (add)
    with BuildSketch(Plane.YZ):
        with BuildLine():
            Line((37.5, 45), (26, 45))
            ThreePointArc((26, 45), (23.171572875, 43.828427125), (22, 41))
            Line((22, 41), (22, -41))
            ThreePointArc((22, -41), (23.171572875, -43.828427125), (26, -45))
            Line((26, -45), (37.5, -45))
            Line((37.5, -45), (37.5, 45))
        make_face()
        with Locations((25, 27.5)):
            Circle(SKETCHED_BEND2_7_OUTLINE_R, mode=Mode.SUBTRACT)
        with Locations((25, -27.5)):
            Circle(SKETCHED_BEND2_7_OUTLINE_R, mode=Mode.SUBTRACT)
    extrude(amount=SKETCHED_BEND2_7_DEPTH)

    # Sketched Bend2 8 outline → Sketched Bend2 8 (add)
    with BuildSketch(Plane.YZ.offset(SKETCHED_START_9)):
        with Locations((36.5, 0)):
            Rectangle(SKETCHED_BEND2_8_OUTLINE_W, SKETCHED_BEND2_8_OUTLINE_H)
    extrude(amount=SKETCHED_BEND2_8_DEPTH)

    # Sketched Bend2 9 outline → Sketched Bend2 9 (add)
    with BuildSketch(Plane.YZ.offset(SKETCHED_START_10)):
        with Locations((36.5, 4)):
            Rectangle(SKETCHED_BEND2_9_OUTLINE_W, SKETCHED_BEND2_9_OUTLINE_H)
        with Locations((36.5, -4)):
            Rectangle(SKETCHED_BEND2_9_OUTLINE_W, SKETCHED_BEND2_9_OUTLINE_H)
    extrude(amount=SKETCHED_BEND2_9_DEPTH)

    # Sketched Bend2 10 outline → Sketched Bend2 10 (cut)
    with BuildSketch(Plane.XY.offset(SKETCHED_START_4)):
        with BuildLine():
            ThreePointArc((16, 33.5), (15.414213563, 34.914213563), (14, 35.5))
            Line((14, 35.5), (14, 22))
            Line((14, 22), (16, 22))
            Line((16, 22), (16, 33.5))
        make_face()
        with BuildLine():
            Line((2, 22), (2, 35.5))
            ThreePointArc((2, 35.5), (0.585786438, 34.914213562), (0, 33.5))
            Line((0, 33.5), (0, 22))
            Line((0, 22), (2, 22))
        make_face()
        with BuildLine():
            ThreePointArc((-2, 33.5), (-0.828427125, 36.328427125), (2, 37.5))
            Line((2, 37.5), (-1.79452, 37.5))
            Line((-1.79452, 37.5), (-1.79452, 35.5))
            Line((-1.79452, 35.5), (-2, 35.5))
            Line((-2, 35.5), (-2, 33.5))
        make_face()
        with BuildLine():
            ThreePointArc((14, 37.5), (16.828427125, 36.328427125), (18, 33.5))
            Line((18, 33.5), (18, 37.5))
            Line((18, 37.5), (14, 37.5))
        make_face()
    extrude(amount=SKETCHED_BEND2_10_DEPTH, mode=Mode.SUBTRACT)

    # Sketched Bend2 11 outline → Sketched Bend2 11 (cut)
    with BuildSketch(Plane(origin=(0, 0, 0), x_dir=(1, 0, 0), z_dir=(0, 1, 0)).offset(SKETCHED_START_11)):
        with Locations((15, -25.125)):
            Rectangle(SKETCHED_BEND2_11_OUTLINE_W, SKETCHED_BEND2_11_OUTLINE_H)
        with Locations((15, 25.125)):
            Rectangle(SKETCHED_BEND2_11_OUTLINE_W, SKETCHED_BEND2_11_OUTLINE_H)
    extrude(amount=SKETCHED_BEND2_11_DEPTH, mode=Mode.SUBTRACT)

    # Sketched Bend2 12 outline → Sketched Bend2 12 (cut)
    with BuildSketch(Plane(origin=(0, 0, 0), x_dir=(1, 0, 0), z_dir=(0, 1, 0)).offset(SKETCHED_START_12)):
        with BuildLine():
            Line((5.250000011, -5.25), (5.250000011, -2.75))
            ThreePointArc((5.250000011, -2.75), (4.000000011, -4), (5.250000011, -5.25))
        make_face()
        with BuildLine():
            ThreePointArc((13.000000011, -1.5), (12.633883488, -2.383883477), (11.750000011, -2.75))
            Line((11.750000011, -2.75), (13.000000011, -2.75))
            Line((13.000000011, -2.75), (13.000000011, -1.5))
        make_face()
        with Locations((17, -25.125)):
            Rectangle(SKETCHED_BEND2_12_OUTLINE_W, SKETCHED_BEND2_12_OUTLINE_H)
        with BuildLine():
            ThreePointArc((11.750000011, 2.75), (12.633883488, 2.383883477), (13.000000011, 1.5))
            Line((13.000000011, 1.5), (13.000000011, 2.75))
            Line((13.000000011, 2.75), (11.750000011, 2.75))
        make_face()
        with Locations((17, 25.125)):
            Rectangle(SKETCHED_BEND2_12_OUTLINE_W, SKETCHED_BEND2_12_OUTLINE_H)
        with BuildLine():
            Line((5.250000011, 2.75), (5.250000011, 5.25))
            ThreePointArc((5.250000011, 5.25), (4.000000011, 4), (5.250000011, 2.75))
        make_face()
    extrude(amount=SKETCHED_BEND2_12_DEPTH, mode=Mode.SUBTRACT)

    # Sketched Bend2 13 outline → Sketched Bend2 13 (cut)
    with BuildSketch(Plane(origin=(0, 0, 0), x_dir=(1, 0, 0), z_dir=(0, 1, 0)).offset(SKETCHED_START_13)):
        with BuildLine():
            Line((5.250000011, -5.25), (5.250000011, -2.75))
            ThreePointArc((5.250000011, -2.75), (4.000000011, -4), (5.250000011, -5.25))
        make_face()
        with BuildLine():
            ThreePointArc((13.000000011, -1.5), (12.633883488, -2.383883477), (11.750000011, -2.75))
            Line((11.750000011, -2.75), (13.000000011, -2.75))
            Line((13.000000011, -2.75), (13.000000011, -1.5))
        make_face()
        with BuildLine():
            ThreePointArc((11.750000011, 2.75), (12.633883488, 2.383883477), (13.000000011, 1.5))
            Line((13.000000011, 1.5), (13.000000011, 2.75))
            Line((13.000000011, 2.75), (11.750000011, 2.75))
        make_face()
        with BuildLine():
            Line((5.250000011, 2.75), (5.250000011, 5.25))
            ThreePointArc((5.250000011, 5.25), (4.000000011, 4), (5.250000011, 2.75))
        make_face()
    extrude(amount=SKETCHED_BEND2_13_DEPTH, mode=Mode.SUBTRACT)


solid = part_1.part
